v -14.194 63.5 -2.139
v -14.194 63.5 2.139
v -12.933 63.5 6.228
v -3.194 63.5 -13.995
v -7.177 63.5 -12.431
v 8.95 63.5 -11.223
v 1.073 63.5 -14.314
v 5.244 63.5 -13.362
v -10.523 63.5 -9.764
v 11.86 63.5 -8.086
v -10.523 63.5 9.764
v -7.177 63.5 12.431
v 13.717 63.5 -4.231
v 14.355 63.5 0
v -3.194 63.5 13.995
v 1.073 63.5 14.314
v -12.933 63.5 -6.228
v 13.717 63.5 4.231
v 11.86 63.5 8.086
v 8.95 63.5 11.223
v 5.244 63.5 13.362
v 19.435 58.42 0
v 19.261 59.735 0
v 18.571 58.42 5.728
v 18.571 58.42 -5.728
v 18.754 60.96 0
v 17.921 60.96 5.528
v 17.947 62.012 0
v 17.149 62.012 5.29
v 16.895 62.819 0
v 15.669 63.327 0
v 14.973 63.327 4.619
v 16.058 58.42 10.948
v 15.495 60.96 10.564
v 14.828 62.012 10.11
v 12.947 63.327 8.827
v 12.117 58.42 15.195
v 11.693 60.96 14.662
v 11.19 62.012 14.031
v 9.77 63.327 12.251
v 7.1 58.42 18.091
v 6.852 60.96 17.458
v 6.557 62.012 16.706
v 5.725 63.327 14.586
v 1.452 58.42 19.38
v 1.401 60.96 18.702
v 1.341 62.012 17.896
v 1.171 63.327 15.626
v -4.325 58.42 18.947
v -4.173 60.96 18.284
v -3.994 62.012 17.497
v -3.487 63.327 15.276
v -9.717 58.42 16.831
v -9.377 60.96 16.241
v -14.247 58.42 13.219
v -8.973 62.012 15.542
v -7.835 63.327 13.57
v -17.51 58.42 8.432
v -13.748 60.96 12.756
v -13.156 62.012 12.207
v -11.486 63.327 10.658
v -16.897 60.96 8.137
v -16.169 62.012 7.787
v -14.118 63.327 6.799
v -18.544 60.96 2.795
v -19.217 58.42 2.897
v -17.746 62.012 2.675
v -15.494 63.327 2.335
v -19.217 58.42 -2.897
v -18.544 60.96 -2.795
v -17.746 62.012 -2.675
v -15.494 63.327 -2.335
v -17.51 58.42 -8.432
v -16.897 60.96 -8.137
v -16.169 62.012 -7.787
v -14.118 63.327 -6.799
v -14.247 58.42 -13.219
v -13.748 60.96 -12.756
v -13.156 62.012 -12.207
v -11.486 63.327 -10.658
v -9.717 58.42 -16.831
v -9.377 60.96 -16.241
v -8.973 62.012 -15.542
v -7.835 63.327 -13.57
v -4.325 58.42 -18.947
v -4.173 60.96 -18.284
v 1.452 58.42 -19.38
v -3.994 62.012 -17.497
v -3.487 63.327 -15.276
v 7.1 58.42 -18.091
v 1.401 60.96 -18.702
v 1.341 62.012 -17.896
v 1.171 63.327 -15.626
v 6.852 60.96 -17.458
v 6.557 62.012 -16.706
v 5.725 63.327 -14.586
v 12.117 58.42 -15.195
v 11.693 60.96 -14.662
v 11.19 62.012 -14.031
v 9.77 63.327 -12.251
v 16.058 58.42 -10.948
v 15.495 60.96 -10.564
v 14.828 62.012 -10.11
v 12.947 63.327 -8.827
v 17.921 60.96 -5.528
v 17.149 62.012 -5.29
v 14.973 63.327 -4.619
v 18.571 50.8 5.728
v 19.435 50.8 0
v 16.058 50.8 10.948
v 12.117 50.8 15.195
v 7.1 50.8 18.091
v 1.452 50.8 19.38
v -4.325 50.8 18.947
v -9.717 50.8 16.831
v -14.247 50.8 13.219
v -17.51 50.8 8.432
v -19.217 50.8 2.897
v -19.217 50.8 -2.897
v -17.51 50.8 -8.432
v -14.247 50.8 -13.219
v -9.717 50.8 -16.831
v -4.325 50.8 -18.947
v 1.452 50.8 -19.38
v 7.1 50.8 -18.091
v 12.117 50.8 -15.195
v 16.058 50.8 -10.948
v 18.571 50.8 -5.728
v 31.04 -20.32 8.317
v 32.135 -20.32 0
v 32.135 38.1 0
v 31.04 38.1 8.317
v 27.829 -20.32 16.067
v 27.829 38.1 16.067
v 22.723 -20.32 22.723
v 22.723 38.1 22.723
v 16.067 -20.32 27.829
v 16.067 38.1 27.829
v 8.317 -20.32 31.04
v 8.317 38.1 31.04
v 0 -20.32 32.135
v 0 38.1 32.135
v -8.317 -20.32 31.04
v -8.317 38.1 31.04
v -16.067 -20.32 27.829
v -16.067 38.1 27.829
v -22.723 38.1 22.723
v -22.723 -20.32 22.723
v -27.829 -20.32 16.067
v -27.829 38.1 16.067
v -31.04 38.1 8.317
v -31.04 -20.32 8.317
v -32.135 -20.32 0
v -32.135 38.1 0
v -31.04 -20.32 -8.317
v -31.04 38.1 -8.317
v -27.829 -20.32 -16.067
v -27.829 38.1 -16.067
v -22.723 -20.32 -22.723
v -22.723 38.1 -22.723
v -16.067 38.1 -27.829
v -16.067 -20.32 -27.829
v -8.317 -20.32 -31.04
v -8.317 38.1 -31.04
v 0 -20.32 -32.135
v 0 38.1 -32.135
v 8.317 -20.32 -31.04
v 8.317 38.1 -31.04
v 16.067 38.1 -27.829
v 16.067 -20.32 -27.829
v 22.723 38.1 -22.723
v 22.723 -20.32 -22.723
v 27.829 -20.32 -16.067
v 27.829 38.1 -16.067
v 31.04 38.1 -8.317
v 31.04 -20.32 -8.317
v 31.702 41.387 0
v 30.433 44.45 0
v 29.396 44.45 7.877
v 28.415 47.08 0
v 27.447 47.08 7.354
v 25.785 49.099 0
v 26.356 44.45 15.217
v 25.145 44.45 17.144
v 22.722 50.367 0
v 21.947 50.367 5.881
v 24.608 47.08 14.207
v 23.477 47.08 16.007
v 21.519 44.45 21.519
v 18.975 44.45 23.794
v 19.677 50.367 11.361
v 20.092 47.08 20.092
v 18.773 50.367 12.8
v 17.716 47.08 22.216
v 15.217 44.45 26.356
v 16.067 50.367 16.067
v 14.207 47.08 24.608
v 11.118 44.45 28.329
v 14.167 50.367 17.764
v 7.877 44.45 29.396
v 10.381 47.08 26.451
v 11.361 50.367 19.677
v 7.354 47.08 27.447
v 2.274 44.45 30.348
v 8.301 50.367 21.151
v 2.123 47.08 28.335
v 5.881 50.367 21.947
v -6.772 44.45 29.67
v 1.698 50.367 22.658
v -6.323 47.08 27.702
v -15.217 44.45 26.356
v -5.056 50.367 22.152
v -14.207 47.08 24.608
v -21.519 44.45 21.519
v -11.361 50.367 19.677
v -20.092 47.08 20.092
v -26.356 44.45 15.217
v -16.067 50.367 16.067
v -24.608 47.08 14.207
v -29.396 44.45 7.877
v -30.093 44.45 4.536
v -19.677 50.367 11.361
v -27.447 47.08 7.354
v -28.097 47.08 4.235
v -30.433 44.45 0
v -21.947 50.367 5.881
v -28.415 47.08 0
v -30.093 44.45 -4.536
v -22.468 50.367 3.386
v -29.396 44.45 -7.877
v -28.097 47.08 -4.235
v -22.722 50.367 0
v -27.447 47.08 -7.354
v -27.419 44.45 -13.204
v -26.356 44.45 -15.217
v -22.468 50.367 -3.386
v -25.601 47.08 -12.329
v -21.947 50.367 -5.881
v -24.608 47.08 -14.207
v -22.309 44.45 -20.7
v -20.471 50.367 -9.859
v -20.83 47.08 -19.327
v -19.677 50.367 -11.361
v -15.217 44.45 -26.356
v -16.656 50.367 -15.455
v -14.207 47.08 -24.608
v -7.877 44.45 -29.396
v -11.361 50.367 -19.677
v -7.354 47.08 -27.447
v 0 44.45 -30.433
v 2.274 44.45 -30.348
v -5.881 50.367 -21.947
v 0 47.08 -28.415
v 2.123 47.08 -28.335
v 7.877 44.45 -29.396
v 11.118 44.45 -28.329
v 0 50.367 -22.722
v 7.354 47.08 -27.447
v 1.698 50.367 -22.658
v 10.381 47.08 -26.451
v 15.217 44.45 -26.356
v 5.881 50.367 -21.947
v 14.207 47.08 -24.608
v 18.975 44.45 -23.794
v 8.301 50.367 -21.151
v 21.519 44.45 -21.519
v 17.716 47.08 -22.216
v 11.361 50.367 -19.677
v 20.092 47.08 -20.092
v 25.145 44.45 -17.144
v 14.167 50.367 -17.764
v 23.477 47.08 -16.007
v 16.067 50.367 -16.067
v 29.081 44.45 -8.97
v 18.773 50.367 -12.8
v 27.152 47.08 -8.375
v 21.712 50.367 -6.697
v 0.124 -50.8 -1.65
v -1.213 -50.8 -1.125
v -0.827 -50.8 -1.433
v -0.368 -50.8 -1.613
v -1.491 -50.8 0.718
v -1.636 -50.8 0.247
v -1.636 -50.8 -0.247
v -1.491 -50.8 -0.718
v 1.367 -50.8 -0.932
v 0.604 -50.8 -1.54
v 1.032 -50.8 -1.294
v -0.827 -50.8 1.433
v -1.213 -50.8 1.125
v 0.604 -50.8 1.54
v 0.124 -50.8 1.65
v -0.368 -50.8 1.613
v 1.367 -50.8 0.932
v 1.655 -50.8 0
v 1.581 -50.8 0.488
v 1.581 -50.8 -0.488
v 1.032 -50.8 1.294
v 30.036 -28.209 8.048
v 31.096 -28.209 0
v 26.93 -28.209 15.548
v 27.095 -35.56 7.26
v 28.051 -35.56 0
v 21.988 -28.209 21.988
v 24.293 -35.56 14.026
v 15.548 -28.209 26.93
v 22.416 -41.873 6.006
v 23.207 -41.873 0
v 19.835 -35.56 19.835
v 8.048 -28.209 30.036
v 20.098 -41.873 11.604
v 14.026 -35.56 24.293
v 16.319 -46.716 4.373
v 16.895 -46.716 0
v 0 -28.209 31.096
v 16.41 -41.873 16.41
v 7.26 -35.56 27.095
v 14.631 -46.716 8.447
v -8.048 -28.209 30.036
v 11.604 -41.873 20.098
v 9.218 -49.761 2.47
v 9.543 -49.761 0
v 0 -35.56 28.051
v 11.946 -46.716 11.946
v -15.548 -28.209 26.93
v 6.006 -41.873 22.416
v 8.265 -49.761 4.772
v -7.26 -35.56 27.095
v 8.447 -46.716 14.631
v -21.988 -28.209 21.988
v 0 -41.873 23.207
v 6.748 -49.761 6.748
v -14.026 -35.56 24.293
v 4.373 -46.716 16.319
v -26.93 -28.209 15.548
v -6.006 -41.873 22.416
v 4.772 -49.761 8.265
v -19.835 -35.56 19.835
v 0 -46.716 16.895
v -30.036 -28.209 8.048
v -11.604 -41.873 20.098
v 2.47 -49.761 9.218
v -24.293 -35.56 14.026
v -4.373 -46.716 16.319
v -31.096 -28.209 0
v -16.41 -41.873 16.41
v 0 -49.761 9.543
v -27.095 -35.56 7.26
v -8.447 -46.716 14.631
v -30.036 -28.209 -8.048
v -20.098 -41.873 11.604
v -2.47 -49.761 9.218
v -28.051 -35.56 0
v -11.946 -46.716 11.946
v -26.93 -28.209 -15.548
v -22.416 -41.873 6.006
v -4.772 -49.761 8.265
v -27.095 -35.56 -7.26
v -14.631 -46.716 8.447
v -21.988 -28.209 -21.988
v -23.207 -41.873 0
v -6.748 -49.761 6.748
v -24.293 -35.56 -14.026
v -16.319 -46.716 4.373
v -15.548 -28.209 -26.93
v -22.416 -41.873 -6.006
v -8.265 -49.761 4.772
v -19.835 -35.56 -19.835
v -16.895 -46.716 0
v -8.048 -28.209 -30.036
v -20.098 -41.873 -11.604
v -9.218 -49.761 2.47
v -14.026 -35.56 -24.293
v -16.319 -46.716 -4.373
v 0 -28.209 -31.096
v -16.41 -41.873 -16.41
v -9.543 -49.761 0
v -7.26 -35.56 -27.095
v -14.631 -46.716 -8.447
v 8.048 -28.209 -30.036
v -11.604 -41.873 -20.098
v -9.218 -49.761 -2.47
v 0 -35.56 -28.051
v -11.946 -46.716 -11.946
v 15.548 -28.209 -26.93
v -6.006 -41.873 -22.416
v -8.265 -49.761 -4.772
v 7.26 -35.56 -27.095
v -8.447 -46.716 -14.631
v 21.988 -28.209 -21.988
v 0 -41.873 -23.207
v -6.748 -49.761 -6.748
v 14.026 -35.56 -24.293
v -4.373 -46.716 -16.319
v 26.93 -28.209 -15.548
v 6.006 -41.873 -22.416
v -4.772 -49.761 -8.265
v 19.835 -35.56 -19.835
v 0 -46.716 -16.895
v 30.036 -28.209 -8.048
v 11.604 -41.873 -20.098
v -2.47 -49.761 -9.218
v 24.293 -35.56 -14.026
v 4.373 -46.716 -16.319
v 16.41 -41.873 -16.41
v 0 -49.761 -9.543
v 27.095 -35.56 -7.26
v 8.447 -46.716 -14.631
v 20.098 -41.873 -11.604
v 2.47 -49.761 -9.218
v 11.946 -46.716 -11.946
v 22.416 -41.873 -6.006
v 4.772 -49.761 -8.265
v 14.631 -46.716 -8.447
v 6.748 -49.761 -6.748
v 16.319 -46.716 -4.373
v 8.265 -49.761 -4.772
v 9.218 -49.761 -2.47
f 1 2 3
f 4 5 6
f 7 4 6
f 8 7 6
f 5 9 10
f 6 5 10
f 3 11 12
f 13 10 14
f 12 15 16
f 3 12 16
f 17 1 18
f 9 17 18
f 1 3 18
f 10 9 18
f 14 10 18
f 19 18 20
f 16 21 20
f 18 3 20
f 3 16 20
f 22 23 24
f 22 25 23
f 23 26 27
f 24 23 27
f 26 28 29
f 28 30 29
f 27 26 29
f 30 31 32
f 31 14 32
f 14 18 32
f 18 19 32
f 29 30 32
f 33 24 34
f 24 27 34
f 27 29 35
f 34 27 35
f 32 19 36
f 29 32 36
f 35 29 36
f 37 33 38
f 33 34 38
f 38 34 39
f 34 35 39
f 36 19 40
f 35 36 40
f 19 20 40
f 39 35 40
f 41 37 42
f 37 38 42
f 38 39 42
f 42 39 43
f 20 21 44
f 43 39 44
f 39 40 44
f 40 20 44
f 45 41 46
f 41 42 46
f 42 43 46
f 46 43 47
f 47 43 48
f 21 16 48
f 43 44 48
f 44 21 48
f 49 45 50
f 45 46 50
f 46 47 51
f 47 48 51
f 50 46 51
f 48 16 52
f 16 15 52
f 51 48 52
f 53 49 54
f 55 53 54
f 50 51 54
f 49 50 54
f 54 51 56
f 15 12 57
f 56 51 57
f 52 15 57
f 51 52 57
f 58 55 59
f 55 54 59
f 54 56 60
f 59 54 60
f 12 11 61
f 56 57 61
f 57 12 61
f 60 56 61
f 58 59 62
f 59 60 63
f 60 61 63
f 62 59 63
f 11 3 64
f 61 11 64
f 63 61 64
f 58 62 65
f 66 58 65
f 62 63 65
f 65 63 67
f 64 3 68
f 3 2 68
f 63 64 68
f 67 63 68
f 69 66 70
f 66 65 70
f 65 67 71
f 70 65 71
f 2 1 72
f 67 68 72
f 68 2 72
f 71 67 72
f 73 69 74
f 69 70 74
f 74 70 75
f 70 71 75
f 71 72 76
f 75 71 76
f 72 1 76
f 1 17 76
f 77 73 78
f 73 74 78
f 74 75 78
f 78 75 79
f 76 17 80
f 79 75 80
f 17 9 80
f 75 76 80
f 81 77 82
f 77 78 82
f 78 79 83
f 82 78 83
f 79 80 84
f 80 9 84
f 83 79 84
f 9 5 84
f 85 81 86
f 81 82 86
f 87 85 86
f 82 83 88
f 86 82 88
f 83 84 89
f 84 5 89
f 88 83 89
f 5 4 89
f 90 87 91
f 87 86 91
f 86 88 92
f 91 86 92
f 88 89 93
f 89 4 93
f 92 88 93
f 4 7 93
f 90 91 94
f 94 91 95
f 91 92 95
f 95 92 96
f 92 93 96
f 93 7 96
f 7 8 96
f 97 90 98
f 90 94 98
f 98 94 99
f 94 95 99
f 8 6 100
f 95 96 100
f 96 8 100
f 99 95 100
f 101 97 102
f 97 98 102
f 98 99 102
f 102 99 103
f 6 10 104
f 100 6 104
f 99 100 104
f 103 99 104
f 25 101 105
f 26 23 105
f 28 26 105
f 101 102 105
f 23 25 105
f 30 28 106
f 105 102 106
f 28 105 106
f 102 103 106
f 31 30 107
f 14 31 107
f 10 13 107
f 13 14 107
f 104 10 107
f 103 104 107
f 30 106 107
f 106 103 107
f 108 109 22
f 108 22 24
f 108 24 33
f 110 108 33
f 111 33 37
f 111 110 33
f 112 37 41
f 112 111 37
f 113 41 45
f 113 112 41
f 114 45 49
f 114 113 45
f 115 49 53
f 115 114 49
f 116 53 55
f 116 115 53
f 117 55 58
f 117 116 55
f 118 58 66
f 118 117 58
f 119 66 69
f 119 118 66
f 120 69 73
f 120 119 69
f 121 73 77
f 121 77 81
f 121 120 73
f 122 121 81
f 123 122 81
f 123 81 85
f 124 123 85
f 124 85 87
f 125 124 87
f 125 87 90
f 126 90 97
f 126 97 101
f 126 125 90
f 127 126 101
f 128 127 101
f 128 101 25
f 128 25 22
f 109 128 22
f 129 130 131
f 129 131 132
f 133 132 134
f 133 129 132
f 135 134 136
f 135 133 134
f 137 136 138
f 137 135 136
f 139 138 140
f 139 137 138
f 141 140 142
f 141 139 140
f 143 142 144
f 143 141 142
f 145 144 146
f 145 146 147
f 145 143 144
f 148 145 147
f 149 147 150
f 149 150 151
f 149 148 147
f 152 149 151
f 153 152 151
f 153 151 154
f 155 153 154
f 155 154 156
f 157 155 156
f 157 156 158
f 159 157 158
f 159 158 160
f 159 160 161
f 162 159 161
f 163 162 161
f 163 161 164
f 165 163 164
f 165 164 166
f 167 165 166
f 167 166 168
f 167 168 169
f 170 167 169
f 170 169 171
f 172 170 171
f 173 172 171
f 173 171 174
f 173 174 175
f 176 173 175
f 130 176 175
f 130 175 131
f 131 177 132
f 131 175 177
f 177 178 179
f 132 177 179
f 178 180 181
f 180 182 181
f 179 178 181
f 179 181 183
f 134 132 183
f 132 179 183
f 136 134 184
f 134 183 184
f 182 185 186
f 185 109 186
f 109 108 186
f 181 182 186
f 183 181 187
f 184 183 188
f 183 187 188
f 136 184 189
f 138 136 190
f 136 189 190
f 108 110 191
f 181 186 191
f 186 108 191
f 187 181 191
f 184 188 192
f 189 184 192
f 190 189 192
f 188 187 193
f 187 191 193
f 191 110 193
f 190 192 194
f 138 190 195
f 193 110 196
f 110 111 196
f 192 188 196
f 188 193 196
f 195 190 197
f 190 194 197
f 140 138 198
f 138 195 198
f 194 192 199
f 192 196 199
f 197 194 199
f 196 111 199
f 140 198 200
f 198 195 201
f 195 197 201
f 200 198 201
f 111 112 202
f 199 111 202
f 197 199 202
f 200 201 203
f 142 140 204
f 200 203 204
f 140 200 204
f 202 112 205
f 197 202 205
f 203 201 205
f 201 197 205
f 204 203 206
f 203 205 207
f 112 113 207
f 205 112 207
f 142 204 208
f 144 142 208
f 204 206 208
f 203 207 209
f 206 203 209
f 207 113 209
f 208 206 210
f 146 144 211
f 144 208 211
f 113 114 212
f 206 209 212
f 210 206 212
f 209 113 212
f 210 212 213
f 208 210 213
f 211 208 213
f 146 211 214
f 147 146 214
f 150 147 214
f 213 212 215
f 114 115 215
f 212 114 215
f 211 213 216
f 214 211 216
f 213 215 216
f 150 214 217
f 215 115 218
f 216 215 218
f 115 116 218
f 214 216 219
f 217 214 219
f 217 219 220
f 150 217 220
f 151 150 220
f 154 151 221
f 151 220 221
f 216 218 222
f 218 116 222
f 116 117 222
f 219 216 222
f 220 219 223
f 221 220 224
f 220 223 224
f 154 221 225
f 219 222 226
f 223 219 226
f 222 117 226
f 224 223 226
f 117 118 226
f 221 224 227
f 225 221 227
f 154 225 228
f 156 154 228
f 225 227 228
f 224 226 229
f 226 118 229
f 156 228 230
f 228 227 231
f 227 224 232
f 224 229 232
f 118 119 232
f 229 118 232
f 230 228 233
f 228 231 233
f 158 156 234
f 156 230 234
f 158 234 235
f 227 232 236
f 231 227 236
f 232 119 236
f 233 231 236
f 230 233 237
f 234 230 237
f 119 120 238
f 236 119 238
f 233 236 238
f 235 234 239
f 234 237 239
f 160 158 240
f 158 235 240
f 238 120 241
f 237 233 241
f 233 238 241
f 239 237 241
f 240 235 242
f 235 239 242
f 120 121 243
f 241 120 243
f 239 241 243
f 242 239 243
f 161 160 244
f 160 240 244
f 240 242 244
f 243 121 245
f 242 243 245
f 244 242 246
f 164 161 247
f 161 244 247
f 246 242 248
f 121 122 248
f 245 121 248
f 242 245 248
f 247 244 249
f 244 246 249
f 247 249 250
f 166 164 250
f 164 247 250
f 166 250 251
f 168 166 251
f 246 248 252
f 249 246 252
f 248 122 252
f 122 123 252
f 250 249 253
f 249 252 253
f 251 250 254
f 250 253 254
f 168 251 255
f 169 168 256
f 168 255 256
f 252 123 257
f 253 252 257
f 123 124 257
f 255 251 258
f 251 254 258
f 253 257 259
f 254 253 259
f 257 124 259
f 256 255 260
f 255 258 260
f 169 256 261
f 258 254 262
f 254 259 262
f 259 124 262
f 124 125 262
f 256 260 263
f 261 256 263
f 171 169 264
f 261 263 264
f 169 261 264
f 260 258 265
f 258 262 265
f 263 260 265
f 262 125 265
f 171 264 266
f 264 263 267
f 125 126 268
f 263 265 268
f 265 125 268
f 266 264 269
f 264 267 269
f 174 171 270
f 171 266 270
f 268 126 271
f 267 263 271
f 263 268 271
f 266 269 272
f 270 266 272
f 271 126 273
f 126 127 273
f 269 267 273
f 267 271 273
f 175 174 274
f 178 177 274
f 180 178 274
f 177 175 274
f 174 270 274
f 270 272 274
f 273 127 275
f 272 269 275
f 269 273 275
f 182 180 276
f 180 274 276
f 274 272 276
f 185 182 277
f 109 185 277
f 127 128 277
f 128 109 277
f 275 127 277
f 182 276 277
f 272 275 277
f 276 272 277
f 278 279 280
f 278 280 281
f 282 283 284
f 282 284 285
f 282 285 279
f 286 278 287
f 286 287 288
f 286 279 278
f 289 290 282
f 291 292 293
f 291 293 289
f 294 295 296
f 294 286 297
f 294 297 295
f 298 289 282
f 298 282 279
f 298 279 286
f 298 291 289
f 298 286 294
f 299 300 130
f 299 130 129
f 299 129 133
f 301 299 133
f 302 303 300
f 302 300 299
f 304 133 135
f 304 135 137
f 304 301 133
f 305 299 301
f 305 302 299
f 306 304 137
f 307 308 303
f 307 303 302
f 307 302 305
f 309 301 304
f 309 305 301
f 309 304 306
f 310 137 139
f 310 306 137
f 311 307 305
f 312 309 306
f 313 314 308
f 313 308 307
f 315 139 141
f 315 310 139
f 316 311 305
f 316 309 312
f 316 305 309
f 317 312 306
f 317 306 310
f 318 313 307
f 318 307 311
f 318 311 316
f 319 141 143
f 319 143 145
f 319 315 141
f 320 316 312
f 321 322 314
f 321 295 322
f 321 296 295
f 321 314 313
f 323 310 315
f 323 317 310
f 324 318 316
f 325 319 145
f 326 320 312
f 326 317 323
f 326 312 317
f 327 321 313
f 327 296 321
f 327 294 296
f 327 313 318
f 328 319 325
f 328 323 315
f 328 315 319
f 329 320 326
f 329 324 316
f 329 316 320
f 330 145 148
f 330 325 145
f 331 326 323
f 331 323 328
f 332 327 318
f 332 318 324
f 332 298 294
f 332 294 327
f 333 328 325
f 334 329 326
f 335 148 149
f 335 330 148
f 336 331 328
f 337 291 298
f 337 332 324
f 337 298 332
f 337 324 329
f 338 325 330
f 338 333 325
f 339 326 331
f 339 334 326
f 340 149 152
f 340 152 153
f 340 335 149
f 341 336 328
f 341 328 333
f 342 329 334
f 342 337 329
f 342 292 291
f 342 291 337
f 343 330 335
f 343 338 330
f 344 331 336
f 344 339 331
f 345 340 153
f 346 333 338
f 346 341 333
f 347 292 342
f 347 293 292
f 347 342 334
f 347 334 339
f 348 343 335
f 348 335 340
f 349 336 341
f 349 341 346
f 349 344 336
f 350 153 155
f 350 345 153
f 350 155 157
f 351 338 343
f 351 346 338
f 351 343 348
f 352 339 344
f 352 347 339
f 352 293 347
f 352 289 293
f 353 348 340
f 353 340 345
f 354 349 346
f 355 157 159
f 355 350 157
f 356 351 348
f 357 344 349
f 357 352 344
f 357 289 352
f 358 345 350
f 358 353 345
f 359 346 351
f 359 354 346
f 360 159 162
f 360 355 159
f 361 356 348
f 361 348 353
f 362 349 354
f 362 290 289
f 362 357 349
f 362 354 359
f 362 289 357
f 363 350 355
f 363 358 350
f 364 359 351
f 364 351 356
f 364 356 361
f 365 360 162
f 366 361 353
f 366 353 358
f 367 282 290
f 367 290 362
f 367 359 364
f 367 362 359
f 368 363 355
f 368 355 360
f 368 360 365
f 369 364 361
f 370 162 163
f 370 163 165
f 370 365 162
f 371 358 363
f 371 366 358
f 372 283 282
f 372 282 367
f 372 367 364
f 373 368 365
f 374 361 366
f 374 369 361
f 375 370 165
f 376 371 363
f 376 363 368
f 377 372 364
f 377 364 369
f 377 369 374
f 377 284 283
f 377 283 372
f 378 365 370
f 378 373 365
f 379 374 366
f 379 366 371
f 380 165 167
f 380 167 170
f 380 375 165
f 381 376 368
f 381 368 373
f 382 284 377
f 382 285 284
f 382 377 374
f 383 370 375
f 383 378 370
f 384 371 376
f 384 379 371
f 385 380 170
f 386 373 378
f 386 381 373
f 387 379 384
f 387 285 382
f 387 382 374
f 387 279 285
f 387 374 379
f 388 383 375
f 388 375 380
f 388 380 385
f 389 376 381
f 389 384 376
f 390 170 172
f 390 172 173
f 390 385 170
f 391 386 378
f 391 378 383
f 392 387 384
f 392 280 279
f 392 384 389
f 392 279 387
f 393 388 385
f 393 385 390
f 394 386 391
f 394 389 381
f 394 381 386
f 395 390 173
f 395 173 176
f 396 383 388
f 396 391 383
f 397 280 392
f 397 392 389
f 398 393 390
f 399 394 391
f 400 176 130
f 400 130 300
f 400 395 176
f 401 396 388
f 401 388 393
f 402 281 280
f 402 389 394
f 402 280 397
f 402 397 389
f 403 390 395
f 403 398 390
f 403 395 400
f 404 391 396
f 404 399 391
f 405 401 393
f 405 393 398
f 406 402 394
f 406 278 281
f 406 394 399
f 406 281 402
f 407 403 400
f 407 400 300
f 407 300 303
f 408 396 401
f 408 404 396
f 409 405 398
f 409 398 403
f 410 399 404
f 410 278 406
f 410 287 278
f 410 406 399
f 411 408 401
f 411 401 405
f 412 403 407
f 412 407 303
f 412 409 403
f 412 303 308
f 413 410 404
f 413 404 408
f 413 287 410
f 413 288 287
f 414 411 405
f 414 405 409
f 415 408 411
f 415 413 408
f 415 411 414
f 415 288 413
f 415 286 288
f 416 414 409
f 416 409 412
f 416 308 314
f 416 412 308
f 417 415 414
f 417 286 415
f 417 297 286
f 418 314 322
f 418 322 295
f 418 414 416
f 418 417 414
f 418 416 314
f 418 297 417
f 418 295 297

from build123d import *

# Parameters (mm, degrees)
F0_R     = 32.1345484261
F1_DEPTH = 50.8
F2_R     = 30.48
F3_R     = 12.7
F4_DEPTH = 12.7
F5_R     = 5.08


with BuildPart() as f1:
    # F0 (on Front) → F1 (new body, symmetric)
    with BuildSketch(Plane.XZ):
        Circle(F0_R)
    extrude(amount=F1_DEPTH, both=True)

    # F2
    f2_edges = [f1.edges().sort_by_distance(p)[0] for p in [
        (-32.134548, -50.8, 0),
    ]]
    fillet(f2_edges, radius=F2_R)

    # F3
    f3_edges = [f1.edges().sort_by_distance(p)[0] for p in [
        (-32.134548, 50.8, 0),
    ]]
    fillet(f3_edges, radius=F3_R)

    # F4 (add): a face of the model
    f4_faces = [f1.faces().sort_by_distance(p)[0] for p in [
        (0, 50.8, 0),
    ]]
    extrude(f4_faces, amount=F4_DEPTH)

    # F5
    f5_edges = [f1.edges().sort_by_distance(p)[0] for p in [
        (-19.434548, 63.5, 0),
    ]]
    fillet(f5_edges, radius=F5_R)


solid = f1.part
